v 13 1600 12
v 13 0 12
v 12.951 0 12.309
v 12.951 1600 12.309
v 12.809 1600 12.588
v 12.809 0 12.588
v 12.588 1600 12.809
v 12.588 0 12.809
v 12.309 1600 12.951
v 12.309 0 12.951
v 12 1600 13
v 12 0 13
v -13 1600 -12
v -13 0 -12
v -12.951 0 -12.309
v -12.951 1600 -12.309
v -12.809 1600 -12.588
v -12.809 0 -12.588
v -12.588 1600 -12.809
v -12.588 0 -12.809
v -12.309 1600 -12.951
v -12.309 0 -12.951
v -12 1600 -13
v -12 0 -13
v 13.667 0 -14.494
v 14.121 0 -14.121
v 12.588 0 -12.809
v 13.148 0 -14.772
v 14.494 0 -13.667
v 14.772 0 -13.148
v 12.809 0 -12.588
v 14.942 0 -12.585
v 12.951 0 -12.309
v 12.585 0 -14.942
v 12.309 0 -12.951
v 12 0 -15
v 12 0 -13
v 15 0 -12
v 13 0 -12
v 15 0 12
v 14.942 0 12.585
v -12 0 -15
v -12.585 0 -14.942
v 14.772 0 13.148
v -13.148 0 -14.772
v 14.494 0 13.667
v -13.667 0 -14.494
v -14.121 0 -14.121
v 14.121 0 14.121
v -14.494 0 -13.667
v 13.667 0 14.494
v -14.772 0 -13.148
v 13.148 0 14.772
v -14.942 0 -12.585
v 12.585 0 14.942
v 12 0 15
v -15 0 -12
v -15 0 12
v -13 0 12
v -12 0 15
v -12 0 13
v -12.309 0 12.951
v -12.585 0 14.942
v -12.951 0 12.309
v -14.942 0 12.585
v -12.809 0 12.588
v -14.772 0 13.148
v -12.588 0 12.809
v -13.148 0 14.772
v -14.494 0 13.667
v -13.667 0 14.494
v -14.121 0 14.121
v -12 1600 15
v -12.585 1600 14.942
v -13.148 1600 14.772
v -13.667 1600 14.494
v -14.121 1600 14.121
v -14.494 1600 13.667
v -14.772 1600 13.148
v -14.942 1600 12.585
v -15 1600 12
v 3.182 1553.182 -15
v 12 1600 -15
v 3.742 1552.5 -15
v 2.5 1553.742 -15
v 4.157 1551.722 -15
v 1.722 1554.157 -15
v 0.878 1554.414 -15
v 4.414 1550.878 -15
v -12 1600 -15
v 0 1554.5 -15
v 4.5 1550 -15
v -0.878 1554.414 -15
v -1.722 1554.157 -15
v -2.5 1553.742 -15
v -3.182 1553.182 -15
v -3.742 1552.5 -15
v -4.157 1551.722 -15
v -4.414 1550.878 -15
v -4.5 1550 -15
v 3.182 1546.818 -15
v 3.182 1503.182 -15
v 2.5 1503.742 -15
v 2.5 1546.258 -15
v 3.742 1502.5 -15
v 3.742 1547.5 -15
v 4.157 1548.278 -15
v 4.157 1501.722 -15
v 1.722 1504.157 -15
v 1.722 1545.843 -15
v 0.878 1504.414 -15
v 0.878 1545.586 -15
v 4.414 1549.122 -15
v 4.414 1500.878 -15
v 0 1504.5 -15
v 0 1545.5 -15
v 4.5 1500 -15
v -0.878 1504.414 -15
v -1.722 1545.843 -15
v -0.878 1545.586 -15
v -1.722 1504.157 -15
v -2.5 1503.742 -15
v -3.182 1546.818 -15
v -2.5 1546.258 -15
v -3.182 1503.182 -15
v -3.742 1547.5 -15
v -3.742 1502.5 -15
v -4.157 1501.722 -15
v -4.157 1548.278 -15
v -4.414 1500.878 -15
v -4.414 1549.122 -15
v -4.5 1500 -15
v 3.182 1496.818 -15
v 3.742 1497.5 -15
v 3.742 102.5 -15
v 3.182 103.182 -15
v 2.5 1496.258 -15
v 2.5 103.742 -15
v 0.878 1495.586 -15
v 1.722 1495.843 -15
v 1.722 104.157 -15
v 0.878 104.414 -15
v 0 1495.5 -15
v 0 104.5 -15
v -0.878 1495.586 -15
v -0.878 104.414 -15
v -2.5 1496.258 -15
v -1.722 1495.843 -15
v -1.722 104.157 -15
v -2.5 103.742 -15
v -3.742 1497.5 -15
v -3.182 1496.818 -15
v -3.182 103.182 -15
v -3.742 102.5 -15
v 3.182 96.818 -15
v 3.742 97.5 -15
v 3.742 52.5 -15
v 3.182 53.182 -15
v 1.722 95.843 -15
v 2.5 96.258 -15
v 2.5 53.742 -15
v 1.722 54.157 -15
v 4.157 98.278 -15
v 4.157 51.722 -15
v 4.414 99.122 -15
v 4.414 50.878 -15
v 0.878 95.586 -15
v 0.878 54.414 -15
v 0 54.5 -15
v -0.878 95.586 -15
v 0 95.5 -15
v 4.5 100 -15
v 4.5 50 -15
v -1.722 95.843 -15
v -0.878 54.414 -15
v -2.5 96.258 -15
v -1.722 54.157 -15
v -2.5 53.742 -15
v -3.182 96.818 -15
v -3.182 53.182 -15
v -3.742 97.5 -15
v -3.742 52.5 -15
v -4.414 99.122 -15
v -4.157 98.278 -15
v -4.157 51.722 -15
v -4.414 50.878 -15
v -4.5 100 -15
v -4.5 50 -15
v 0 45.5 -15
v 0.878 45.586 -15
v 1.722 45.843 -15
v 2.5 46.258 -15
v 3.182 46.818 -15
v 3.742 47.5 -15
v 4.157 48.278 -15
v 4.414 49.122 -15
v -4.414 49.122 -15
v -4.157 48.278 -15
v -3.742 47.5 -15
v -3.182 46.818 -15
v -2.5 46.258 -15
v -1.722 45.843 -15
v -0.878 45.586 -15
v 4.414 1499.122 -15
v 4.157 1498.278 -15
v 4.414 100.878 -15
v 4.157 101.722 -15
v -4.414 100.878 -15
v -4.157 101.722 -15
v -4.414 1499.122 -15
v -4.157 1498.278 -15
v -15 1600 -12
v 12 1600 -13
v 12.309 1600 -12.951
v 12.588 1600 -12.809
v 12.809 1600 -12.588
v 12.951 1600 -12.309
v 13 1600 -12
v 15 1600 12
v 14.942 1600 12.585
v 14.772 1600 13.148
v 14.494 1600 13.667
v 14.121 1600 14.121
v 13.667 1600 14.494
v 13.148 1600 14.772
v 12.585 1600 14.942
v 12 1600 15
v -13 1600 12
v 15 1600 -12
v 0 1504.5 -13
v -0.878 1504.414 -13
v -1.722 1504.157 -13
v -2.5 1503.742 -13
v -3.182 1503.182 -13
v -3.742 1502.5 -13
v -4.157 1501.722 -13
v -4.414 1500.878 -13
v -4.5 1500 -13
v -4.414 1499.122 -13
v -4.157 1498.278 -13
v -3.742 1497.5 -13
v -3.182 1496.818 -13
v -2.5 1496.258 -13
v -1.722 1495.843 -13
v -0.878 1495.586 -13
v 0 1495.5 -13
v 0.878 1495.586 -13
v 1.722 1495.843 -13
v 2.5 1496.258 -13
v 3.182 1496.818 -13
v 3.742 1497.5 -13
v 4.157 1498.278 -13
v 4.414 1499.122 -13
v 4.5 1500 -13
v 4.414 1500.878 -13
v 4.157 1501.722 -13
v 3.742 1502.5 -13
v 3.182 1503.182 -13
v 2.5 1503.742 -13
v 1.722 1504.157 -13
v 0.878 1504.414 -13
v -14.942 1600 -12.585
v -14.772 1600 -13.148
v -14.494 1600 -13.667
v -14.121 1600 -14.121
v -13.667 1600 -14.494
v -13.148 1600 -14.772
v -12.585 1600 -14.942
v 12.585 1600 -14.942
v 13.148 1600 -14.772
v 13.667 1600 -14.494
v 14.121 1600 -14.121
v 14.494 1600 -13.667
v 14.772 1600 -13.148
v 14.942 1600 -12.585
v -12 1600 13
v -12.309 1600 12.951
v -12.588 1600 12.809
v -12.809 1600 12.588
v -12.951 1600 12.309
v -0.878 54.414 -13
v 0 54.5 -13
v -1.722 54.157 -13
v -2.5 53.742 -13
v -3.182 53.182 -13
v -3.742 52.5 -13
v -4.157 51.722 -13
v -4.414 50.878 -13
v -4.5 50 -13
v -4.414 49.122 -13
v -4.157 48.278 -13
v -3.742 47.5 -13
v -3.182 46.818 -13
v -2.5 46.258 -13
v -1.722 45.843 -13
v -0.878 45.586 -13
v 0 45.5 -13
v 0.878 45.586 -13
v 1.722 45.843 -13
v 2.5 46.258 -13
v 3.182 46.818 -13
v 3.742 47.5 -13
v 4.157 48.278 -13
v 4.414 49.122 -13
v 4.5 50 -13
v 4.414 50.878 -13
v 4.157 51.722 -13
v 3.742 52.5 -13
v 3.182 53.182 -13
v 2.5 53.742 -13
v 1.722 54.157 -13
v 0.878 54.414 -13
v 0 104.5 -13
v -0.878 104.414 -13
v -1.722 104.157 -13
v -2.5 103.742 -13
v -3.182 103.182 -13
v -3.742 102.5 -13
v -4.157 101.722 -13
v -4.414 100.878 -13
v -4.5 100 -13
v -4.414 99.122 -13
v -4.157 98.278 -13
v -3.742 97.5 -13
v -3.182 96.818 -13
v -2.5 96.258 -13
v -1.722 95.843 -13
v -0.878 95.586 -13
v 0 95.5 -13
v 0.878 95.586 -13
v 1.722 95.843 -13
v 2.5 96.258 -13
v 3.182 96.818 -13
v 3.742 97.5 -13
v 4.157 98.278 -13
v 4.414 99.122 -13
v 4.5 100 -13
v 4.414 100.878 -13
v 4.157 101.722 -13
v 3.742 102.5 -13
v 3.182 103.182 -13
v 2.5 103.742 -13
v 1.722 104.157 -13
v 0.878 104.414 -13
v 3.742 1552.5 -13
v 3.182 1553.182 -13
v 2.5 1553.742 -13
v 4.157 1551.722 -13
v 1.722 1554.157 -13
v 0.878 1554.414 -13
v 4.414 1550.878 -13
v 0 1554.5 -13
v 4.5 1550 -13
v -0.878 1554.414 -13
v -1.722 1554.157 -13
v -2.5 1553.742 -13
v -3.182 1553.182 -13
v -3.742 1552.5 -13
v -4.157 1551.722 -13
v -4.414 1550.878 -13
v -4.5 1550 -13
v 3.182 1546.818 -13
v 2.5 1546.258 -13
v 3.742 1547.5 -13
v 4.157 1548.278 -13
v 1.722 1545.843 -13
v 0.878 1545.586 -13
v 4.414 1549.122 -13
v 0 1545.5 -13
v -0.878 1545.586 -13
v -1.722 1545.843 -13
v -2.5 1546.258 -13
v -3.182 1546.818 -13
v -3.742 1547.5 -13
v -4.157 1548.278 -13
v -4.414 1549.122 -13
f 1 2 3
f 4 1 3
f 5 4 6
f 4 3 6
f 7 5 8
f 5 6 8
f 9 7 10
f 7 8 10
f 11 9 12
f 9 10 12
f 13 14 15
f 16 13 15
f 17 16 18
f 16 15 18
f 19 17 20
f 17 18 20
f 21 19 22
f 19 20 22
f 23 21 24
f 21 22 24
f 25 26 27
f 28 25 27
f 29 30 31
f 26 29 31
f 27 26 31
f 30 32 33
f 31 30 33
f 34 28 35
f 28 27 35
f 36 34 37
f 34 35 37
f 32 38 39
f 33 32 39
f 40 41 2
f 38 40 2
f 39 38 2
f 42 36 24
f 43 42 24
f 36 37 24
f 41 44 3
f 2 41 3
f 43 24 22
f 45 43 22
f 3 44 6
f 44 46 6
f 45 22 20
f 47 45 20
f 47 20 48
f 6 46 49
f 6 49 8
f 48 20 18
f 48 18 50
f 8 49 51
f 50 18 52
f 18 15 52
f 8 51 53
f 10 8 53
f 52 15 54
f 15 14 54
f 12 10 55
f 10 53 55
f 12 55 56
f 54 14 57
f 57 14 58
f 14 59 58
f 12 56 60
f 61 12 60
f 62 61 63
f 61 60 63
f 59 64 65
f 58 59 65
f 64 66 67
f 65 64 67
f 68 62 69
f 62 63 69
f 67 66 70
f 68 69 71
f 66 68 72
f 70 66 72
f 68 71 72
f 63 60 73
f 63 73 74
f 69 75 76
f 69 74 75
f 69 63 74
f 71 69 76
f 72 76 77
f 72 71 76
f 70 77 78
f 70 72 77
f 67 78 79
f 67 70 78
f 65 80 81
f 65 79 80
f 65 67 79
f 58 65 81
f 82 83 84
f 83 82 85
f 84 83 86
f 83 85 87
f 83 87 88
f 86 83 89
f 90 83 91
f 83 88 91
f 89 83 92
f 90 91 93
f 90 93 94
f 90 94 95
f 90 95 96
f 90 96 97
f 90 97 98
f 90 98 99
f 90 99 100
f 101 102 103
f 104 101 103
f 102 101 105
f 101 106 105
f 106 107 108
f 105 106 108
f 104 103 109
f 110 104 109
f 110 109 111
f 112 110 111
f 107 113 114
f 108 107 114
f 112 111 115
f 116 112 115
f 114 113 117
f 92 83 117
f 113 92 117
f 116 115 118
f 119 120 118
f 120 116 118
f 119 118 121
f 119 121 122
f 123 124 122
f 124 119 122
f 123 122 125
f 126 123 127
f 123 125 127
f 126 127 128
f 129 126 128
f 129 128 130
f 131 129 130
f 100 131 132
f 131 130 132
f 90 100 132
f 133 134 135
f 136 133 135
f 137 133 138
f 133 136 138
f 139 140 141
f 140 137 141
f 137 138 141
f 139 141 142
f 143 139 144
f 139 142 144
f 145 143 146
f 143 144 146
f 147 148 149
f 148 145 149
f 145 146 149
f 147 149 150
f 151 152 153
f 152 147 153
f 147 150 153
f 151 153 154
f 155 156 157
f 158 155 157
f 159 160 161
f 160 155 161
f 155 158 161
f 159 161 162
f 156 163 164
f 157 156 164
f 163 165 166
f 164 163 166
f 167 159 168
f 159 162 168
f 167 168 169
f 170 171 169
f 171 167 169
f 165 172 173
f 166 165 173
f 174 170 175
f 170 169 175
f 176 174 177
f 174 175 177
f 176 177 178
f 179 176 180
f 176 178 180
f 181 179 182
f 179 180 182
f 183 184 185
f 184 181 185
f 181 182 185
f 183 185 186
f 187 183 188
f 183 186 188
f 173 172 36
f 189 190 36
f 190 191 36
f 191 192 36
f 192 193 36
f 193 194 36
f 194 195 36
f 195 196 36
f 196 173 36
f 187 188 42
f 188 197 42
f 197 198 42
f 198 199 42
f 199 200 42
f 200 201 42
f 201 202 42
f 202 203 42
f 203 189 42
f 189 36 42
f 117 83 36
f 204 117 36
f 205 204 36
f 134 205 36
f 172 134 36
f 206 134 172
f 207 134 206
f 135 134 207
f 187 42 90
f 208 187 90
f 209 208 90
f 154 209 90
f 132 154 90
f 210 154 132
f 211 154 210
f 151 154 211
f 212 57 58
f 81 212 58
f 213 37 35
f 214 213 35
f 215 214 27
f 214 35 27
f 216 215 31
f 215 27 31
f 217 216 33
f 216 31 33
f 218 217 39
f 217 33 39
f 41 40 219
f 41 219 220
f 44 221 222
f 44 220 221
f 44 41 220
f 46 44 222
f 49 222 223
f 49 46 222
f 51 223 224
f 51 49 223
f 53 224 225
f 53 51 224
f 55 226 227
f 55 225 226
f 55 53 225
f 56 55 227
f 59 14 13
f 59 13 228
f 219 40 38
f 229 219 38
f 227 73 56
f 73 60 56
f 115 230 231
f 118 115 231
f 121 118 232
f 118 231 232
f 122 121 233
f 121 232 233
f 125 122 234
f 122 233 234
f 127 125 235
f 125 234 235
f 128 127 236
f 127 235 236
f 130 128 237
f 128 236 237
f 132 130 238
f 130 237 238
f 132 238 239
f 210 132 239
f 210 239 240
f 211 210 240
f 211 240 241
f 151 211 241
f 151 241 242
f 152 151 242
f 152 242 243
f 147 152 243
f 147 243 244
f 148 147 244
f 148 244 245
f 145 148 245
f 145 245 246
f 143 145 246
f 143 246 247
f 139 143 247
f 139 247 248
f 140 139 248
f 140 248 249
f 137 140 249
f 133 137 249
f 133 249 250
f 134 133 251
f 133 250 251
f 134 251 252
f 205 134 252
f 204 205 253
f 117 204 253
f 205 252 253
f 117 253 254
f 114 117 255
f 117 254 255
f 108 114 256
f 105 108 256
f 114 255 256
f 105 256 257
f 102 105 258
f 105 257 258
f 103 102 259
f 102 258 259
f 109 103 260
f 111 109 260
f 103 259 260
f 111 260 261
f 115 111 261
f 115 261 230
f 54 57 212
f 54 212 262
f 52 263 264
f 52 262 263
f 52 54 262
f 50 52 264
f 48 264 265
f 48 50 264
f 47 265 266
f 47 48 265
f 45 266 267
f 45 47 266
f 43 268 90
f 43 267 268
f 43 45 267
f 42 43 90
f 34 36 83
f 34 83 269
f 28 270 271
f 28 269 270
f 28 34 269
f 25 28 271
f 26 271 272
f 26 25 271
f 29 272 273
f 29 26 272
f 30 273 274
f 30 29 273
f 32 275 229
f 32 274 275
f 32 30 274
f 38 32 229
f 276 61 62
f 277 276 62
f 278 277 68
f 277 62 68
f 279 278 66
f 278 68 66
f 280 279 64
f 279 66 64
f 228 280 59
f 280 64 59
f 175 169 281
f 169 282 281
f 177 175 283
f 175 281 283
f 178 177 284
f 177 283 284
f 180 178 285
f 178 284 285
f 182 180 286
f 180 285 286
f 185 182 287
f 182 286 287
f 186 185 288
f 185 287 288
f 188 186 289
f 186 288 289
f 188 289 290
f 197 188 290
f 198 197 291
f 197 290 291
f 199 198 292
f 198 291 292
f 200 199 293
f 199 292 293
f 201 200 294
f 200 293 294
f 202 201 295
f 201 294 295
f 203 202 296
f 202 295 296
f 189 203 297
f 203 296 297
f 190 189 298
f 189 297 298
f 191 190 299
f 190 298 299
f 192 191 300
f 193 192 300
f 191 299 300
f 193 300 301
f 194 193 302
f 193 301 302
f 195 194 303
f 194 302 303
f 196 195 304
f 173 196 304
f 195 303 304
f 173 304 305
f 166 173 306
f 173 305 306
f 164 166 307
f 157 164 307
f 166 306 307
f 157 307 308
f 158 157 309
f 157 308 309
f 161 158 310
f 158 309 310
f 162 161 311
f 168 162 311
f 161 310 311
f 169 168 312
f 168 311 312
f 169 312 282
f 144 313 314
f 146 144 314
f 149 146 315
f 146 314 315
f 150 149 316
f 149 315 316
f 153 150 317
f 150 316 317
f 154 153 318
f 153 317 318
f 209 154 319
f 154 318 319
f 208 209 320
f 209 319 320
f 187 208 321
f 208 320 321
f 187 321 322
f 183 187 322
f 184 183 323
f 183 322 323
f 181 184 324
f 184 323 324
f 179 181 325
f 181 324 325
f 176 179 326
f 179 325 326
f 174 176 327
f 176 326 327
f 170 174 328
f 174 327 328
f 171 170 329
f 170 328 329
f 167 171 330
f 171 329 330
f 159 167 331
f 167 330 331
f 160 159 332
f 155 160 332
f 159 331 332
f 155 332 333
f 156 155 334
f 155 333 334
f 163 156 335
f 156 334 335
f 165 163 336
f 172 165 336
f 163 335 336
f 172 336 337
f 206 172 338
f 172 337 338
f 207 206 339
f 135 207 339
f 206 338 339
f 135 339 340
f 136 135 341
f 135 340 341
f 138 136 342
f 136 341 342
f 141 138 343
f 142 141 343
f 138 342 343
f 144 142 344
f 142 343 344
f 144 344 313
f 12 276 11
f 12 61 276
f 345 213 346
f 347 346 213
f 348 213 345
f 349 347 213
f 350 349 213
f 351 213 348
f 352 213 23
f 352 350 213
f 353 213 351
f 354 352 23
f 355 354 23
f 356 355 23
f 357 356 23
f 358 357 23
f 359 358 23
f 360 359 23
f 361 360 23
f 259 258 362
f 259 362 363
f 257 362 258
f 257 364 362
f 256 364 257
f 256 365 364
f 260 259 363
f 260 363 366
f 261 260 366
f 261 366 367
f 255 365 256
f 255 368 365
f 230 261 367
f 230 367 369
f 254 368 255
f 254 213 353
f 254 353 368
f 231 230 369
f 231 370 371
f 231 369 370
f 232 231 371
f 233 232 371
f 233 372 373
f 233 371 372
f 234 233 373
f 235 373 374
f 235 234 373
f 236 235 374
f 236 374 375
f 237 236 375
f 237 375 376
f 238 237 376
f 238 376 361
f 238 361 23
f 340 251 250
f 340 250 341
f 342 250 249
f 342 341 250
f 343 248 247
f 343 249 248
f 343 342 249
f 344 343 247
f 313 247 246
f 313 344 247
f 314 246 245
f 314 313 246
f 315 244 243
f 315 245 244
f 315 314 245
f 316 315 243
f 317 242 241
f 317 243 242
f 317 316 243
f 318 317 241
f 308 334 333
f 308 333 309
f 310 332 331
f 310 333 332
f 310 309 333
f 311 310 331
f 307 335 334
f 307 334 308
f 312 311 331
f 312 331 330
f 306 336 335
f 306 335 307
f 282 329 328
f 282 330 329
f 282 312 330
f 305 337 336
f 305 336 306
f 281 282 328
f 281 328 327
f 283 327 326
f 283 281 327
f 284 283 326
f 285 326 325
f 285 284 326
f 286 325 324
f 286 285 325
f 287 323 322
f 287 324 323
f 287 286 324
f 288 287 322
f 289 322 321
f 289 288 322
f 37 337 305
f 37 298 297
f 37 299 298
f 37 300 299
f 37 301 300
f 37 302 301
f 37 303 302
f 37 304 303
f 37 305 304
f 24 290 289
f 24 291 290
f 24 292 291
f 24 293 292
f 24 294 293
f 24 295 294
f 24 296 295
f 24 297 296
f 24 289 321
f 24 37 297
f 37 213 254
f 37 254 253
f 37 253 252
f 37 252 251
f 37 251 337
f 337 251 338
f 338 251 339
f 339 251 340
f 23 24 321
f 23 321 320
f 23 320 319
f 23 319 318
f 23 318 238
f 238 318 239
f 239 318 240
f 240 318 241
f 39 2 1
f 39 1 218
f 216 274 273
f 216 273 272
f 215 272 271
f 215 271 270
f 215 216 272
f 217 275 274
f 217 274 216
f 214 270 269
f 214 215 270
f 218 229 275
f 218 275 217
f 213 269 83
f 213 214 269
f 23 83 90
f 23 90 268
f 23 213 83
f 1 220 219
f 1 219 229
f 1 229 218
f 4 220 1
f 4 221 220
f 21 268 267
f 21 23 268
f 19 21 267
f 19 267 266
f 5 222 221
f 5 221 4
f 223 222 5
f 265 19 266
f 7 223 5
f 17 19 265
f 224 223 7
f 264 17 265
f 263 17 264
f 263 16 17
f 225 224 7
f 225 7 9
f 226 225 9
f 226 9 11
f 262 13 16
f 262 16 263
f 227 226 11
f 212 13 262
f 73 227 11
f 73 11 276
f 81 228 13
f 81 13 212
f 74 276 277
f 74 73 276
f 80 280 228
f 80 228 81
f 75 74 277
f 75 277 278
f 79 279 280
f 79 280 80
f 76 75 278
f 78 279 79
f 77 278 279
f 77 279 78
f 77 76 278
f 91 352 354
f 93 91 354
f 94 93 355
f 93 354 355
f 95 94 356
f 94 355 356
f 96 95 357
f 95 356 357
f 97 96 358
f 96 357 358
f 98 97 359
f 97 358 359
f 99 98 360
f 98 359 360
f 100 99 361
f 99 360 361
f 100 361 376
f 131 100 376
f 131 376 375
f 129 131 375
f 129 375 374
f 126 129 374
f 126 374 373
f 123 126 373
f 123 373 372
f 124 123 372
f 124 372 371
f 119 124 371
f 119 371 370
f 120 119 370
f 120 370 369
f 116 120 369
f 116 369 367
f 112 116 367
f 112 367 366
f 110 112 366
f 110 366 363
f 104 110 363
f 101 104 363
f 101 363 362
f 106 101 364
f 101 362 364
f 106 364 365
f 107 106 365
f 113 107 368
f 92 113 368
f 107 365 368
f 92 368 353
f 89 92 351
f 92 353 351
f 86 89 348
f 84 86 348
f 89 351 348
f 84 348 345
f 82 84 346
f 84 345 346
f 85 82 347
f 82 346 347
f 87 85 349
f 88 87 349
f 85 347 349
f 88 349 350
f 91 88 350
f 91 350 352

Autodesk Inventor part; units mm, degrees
ref_plane "XZ Plane" through (0, 0, 0) normal (0, 1, 0) x (-1, 0, 0)
sketch "Sketch1" plane through (0, 0, 0) normal (0, 1, 0) x (-1, 0, 0)
  line L0 (-12, 14) -> (12, 14) construction
  line L1 (14, 12) -> (14, -12) construction
  line L2 (12, -14) -> (-12, -14) construction
  line L3 (-14, -12) -> (-14, 12) construction
  line L4 (-14, 14) -> (14, -14) construction
  line L5 (14, 14) -> (-14, -14) construction
  arc A0 (14, 12) -> (12, 14) centre (12, 12) ccw construction
  arc A1 (12, -14) -> (14, -12) centre (12, -12) ccw construction
  arc A2 (-14, -12) -> (-12, -14) centre (-12, -12) ccw construction
  arc A3 (-12, 14) -> (-14, 12) centre (-12, 12) ccw construction
  line L6 (-12, -15) -> (12, -15)
  arc A4 (12, -15) -> (15, -12) centre (12, -12) ccw
  line L7 (15, -12) -> (15, 12)
  arc A5 (15, 12) -> (12, 15) centre (12, 12) ccw
  line L8 (12, 15) -> (-12, 15)
  arc A6 (-12, 15) -> (-15, 12) centre (-12, 12) ccw
  line L9 (-15, 12) -> (-15, -12)
  arc A7 (-15, -12) -> (-12, -15) centre (-12, -12) ccw
  line L10 (13, -12) -> (13, 12)
  arc A8 (13, 12) -> (12, 13) centre (12, 12) ccw
  line L11 (12, 13) -> (-12, 13)
  arc A9 (-12, 13) -> (-13, 12) centre (-12, 12) ccw
  line L12 (-13, 12) -> (-13, -12)
  arc A10 (-13, -12) -> (-12, -13) centre (-12, -12) ccw
  line L13 (-12, -13) -> (12, -13)
  arc A11 (12, -13) -> (13, -12) centre (12, -12) ccw
  point P0 (0, 0)
  point P1 (0, 0)
  point P2 (0, 0)
  dimension "d10" = 2
  dimension "depth" = 30
  dimension "width" = 30
  dimension "thickness" = 2
extrude "Extrusion1" add sketch "Sketch1" along normal blind 1600
sketch "Sketch2" plane through (12, 0, -15) normal (0, 0, -1) x (-1, 0, 0)
  line L0 (12, -390) -> (12, 2340) construction
  line L1 (0, 0) -> (24, 0) projected
  line L2 (0, 1600) -> (24, 1600) projected
  point P0 (12, 0)
  point P1 (12, 50)
  point P2 (12, 100)
  point P3 (12, 1550)
  point P4 (12, 1500)
  dimension "d16" = 50
  dimension "d17" = 50
  dimension "d18" = 50
  dimension "d20" = 50
hole "Hole1" at (0, 50, -15) at (0, 100, -15) at (0, 1550, -15) at (0, 1500, -15) direction (0, 0, 1) diameter 9 depth 20.2 tip angle 118
equation "\"d10\" = thickness"
properties part number "Przedluzka L1500" material "Steel"
